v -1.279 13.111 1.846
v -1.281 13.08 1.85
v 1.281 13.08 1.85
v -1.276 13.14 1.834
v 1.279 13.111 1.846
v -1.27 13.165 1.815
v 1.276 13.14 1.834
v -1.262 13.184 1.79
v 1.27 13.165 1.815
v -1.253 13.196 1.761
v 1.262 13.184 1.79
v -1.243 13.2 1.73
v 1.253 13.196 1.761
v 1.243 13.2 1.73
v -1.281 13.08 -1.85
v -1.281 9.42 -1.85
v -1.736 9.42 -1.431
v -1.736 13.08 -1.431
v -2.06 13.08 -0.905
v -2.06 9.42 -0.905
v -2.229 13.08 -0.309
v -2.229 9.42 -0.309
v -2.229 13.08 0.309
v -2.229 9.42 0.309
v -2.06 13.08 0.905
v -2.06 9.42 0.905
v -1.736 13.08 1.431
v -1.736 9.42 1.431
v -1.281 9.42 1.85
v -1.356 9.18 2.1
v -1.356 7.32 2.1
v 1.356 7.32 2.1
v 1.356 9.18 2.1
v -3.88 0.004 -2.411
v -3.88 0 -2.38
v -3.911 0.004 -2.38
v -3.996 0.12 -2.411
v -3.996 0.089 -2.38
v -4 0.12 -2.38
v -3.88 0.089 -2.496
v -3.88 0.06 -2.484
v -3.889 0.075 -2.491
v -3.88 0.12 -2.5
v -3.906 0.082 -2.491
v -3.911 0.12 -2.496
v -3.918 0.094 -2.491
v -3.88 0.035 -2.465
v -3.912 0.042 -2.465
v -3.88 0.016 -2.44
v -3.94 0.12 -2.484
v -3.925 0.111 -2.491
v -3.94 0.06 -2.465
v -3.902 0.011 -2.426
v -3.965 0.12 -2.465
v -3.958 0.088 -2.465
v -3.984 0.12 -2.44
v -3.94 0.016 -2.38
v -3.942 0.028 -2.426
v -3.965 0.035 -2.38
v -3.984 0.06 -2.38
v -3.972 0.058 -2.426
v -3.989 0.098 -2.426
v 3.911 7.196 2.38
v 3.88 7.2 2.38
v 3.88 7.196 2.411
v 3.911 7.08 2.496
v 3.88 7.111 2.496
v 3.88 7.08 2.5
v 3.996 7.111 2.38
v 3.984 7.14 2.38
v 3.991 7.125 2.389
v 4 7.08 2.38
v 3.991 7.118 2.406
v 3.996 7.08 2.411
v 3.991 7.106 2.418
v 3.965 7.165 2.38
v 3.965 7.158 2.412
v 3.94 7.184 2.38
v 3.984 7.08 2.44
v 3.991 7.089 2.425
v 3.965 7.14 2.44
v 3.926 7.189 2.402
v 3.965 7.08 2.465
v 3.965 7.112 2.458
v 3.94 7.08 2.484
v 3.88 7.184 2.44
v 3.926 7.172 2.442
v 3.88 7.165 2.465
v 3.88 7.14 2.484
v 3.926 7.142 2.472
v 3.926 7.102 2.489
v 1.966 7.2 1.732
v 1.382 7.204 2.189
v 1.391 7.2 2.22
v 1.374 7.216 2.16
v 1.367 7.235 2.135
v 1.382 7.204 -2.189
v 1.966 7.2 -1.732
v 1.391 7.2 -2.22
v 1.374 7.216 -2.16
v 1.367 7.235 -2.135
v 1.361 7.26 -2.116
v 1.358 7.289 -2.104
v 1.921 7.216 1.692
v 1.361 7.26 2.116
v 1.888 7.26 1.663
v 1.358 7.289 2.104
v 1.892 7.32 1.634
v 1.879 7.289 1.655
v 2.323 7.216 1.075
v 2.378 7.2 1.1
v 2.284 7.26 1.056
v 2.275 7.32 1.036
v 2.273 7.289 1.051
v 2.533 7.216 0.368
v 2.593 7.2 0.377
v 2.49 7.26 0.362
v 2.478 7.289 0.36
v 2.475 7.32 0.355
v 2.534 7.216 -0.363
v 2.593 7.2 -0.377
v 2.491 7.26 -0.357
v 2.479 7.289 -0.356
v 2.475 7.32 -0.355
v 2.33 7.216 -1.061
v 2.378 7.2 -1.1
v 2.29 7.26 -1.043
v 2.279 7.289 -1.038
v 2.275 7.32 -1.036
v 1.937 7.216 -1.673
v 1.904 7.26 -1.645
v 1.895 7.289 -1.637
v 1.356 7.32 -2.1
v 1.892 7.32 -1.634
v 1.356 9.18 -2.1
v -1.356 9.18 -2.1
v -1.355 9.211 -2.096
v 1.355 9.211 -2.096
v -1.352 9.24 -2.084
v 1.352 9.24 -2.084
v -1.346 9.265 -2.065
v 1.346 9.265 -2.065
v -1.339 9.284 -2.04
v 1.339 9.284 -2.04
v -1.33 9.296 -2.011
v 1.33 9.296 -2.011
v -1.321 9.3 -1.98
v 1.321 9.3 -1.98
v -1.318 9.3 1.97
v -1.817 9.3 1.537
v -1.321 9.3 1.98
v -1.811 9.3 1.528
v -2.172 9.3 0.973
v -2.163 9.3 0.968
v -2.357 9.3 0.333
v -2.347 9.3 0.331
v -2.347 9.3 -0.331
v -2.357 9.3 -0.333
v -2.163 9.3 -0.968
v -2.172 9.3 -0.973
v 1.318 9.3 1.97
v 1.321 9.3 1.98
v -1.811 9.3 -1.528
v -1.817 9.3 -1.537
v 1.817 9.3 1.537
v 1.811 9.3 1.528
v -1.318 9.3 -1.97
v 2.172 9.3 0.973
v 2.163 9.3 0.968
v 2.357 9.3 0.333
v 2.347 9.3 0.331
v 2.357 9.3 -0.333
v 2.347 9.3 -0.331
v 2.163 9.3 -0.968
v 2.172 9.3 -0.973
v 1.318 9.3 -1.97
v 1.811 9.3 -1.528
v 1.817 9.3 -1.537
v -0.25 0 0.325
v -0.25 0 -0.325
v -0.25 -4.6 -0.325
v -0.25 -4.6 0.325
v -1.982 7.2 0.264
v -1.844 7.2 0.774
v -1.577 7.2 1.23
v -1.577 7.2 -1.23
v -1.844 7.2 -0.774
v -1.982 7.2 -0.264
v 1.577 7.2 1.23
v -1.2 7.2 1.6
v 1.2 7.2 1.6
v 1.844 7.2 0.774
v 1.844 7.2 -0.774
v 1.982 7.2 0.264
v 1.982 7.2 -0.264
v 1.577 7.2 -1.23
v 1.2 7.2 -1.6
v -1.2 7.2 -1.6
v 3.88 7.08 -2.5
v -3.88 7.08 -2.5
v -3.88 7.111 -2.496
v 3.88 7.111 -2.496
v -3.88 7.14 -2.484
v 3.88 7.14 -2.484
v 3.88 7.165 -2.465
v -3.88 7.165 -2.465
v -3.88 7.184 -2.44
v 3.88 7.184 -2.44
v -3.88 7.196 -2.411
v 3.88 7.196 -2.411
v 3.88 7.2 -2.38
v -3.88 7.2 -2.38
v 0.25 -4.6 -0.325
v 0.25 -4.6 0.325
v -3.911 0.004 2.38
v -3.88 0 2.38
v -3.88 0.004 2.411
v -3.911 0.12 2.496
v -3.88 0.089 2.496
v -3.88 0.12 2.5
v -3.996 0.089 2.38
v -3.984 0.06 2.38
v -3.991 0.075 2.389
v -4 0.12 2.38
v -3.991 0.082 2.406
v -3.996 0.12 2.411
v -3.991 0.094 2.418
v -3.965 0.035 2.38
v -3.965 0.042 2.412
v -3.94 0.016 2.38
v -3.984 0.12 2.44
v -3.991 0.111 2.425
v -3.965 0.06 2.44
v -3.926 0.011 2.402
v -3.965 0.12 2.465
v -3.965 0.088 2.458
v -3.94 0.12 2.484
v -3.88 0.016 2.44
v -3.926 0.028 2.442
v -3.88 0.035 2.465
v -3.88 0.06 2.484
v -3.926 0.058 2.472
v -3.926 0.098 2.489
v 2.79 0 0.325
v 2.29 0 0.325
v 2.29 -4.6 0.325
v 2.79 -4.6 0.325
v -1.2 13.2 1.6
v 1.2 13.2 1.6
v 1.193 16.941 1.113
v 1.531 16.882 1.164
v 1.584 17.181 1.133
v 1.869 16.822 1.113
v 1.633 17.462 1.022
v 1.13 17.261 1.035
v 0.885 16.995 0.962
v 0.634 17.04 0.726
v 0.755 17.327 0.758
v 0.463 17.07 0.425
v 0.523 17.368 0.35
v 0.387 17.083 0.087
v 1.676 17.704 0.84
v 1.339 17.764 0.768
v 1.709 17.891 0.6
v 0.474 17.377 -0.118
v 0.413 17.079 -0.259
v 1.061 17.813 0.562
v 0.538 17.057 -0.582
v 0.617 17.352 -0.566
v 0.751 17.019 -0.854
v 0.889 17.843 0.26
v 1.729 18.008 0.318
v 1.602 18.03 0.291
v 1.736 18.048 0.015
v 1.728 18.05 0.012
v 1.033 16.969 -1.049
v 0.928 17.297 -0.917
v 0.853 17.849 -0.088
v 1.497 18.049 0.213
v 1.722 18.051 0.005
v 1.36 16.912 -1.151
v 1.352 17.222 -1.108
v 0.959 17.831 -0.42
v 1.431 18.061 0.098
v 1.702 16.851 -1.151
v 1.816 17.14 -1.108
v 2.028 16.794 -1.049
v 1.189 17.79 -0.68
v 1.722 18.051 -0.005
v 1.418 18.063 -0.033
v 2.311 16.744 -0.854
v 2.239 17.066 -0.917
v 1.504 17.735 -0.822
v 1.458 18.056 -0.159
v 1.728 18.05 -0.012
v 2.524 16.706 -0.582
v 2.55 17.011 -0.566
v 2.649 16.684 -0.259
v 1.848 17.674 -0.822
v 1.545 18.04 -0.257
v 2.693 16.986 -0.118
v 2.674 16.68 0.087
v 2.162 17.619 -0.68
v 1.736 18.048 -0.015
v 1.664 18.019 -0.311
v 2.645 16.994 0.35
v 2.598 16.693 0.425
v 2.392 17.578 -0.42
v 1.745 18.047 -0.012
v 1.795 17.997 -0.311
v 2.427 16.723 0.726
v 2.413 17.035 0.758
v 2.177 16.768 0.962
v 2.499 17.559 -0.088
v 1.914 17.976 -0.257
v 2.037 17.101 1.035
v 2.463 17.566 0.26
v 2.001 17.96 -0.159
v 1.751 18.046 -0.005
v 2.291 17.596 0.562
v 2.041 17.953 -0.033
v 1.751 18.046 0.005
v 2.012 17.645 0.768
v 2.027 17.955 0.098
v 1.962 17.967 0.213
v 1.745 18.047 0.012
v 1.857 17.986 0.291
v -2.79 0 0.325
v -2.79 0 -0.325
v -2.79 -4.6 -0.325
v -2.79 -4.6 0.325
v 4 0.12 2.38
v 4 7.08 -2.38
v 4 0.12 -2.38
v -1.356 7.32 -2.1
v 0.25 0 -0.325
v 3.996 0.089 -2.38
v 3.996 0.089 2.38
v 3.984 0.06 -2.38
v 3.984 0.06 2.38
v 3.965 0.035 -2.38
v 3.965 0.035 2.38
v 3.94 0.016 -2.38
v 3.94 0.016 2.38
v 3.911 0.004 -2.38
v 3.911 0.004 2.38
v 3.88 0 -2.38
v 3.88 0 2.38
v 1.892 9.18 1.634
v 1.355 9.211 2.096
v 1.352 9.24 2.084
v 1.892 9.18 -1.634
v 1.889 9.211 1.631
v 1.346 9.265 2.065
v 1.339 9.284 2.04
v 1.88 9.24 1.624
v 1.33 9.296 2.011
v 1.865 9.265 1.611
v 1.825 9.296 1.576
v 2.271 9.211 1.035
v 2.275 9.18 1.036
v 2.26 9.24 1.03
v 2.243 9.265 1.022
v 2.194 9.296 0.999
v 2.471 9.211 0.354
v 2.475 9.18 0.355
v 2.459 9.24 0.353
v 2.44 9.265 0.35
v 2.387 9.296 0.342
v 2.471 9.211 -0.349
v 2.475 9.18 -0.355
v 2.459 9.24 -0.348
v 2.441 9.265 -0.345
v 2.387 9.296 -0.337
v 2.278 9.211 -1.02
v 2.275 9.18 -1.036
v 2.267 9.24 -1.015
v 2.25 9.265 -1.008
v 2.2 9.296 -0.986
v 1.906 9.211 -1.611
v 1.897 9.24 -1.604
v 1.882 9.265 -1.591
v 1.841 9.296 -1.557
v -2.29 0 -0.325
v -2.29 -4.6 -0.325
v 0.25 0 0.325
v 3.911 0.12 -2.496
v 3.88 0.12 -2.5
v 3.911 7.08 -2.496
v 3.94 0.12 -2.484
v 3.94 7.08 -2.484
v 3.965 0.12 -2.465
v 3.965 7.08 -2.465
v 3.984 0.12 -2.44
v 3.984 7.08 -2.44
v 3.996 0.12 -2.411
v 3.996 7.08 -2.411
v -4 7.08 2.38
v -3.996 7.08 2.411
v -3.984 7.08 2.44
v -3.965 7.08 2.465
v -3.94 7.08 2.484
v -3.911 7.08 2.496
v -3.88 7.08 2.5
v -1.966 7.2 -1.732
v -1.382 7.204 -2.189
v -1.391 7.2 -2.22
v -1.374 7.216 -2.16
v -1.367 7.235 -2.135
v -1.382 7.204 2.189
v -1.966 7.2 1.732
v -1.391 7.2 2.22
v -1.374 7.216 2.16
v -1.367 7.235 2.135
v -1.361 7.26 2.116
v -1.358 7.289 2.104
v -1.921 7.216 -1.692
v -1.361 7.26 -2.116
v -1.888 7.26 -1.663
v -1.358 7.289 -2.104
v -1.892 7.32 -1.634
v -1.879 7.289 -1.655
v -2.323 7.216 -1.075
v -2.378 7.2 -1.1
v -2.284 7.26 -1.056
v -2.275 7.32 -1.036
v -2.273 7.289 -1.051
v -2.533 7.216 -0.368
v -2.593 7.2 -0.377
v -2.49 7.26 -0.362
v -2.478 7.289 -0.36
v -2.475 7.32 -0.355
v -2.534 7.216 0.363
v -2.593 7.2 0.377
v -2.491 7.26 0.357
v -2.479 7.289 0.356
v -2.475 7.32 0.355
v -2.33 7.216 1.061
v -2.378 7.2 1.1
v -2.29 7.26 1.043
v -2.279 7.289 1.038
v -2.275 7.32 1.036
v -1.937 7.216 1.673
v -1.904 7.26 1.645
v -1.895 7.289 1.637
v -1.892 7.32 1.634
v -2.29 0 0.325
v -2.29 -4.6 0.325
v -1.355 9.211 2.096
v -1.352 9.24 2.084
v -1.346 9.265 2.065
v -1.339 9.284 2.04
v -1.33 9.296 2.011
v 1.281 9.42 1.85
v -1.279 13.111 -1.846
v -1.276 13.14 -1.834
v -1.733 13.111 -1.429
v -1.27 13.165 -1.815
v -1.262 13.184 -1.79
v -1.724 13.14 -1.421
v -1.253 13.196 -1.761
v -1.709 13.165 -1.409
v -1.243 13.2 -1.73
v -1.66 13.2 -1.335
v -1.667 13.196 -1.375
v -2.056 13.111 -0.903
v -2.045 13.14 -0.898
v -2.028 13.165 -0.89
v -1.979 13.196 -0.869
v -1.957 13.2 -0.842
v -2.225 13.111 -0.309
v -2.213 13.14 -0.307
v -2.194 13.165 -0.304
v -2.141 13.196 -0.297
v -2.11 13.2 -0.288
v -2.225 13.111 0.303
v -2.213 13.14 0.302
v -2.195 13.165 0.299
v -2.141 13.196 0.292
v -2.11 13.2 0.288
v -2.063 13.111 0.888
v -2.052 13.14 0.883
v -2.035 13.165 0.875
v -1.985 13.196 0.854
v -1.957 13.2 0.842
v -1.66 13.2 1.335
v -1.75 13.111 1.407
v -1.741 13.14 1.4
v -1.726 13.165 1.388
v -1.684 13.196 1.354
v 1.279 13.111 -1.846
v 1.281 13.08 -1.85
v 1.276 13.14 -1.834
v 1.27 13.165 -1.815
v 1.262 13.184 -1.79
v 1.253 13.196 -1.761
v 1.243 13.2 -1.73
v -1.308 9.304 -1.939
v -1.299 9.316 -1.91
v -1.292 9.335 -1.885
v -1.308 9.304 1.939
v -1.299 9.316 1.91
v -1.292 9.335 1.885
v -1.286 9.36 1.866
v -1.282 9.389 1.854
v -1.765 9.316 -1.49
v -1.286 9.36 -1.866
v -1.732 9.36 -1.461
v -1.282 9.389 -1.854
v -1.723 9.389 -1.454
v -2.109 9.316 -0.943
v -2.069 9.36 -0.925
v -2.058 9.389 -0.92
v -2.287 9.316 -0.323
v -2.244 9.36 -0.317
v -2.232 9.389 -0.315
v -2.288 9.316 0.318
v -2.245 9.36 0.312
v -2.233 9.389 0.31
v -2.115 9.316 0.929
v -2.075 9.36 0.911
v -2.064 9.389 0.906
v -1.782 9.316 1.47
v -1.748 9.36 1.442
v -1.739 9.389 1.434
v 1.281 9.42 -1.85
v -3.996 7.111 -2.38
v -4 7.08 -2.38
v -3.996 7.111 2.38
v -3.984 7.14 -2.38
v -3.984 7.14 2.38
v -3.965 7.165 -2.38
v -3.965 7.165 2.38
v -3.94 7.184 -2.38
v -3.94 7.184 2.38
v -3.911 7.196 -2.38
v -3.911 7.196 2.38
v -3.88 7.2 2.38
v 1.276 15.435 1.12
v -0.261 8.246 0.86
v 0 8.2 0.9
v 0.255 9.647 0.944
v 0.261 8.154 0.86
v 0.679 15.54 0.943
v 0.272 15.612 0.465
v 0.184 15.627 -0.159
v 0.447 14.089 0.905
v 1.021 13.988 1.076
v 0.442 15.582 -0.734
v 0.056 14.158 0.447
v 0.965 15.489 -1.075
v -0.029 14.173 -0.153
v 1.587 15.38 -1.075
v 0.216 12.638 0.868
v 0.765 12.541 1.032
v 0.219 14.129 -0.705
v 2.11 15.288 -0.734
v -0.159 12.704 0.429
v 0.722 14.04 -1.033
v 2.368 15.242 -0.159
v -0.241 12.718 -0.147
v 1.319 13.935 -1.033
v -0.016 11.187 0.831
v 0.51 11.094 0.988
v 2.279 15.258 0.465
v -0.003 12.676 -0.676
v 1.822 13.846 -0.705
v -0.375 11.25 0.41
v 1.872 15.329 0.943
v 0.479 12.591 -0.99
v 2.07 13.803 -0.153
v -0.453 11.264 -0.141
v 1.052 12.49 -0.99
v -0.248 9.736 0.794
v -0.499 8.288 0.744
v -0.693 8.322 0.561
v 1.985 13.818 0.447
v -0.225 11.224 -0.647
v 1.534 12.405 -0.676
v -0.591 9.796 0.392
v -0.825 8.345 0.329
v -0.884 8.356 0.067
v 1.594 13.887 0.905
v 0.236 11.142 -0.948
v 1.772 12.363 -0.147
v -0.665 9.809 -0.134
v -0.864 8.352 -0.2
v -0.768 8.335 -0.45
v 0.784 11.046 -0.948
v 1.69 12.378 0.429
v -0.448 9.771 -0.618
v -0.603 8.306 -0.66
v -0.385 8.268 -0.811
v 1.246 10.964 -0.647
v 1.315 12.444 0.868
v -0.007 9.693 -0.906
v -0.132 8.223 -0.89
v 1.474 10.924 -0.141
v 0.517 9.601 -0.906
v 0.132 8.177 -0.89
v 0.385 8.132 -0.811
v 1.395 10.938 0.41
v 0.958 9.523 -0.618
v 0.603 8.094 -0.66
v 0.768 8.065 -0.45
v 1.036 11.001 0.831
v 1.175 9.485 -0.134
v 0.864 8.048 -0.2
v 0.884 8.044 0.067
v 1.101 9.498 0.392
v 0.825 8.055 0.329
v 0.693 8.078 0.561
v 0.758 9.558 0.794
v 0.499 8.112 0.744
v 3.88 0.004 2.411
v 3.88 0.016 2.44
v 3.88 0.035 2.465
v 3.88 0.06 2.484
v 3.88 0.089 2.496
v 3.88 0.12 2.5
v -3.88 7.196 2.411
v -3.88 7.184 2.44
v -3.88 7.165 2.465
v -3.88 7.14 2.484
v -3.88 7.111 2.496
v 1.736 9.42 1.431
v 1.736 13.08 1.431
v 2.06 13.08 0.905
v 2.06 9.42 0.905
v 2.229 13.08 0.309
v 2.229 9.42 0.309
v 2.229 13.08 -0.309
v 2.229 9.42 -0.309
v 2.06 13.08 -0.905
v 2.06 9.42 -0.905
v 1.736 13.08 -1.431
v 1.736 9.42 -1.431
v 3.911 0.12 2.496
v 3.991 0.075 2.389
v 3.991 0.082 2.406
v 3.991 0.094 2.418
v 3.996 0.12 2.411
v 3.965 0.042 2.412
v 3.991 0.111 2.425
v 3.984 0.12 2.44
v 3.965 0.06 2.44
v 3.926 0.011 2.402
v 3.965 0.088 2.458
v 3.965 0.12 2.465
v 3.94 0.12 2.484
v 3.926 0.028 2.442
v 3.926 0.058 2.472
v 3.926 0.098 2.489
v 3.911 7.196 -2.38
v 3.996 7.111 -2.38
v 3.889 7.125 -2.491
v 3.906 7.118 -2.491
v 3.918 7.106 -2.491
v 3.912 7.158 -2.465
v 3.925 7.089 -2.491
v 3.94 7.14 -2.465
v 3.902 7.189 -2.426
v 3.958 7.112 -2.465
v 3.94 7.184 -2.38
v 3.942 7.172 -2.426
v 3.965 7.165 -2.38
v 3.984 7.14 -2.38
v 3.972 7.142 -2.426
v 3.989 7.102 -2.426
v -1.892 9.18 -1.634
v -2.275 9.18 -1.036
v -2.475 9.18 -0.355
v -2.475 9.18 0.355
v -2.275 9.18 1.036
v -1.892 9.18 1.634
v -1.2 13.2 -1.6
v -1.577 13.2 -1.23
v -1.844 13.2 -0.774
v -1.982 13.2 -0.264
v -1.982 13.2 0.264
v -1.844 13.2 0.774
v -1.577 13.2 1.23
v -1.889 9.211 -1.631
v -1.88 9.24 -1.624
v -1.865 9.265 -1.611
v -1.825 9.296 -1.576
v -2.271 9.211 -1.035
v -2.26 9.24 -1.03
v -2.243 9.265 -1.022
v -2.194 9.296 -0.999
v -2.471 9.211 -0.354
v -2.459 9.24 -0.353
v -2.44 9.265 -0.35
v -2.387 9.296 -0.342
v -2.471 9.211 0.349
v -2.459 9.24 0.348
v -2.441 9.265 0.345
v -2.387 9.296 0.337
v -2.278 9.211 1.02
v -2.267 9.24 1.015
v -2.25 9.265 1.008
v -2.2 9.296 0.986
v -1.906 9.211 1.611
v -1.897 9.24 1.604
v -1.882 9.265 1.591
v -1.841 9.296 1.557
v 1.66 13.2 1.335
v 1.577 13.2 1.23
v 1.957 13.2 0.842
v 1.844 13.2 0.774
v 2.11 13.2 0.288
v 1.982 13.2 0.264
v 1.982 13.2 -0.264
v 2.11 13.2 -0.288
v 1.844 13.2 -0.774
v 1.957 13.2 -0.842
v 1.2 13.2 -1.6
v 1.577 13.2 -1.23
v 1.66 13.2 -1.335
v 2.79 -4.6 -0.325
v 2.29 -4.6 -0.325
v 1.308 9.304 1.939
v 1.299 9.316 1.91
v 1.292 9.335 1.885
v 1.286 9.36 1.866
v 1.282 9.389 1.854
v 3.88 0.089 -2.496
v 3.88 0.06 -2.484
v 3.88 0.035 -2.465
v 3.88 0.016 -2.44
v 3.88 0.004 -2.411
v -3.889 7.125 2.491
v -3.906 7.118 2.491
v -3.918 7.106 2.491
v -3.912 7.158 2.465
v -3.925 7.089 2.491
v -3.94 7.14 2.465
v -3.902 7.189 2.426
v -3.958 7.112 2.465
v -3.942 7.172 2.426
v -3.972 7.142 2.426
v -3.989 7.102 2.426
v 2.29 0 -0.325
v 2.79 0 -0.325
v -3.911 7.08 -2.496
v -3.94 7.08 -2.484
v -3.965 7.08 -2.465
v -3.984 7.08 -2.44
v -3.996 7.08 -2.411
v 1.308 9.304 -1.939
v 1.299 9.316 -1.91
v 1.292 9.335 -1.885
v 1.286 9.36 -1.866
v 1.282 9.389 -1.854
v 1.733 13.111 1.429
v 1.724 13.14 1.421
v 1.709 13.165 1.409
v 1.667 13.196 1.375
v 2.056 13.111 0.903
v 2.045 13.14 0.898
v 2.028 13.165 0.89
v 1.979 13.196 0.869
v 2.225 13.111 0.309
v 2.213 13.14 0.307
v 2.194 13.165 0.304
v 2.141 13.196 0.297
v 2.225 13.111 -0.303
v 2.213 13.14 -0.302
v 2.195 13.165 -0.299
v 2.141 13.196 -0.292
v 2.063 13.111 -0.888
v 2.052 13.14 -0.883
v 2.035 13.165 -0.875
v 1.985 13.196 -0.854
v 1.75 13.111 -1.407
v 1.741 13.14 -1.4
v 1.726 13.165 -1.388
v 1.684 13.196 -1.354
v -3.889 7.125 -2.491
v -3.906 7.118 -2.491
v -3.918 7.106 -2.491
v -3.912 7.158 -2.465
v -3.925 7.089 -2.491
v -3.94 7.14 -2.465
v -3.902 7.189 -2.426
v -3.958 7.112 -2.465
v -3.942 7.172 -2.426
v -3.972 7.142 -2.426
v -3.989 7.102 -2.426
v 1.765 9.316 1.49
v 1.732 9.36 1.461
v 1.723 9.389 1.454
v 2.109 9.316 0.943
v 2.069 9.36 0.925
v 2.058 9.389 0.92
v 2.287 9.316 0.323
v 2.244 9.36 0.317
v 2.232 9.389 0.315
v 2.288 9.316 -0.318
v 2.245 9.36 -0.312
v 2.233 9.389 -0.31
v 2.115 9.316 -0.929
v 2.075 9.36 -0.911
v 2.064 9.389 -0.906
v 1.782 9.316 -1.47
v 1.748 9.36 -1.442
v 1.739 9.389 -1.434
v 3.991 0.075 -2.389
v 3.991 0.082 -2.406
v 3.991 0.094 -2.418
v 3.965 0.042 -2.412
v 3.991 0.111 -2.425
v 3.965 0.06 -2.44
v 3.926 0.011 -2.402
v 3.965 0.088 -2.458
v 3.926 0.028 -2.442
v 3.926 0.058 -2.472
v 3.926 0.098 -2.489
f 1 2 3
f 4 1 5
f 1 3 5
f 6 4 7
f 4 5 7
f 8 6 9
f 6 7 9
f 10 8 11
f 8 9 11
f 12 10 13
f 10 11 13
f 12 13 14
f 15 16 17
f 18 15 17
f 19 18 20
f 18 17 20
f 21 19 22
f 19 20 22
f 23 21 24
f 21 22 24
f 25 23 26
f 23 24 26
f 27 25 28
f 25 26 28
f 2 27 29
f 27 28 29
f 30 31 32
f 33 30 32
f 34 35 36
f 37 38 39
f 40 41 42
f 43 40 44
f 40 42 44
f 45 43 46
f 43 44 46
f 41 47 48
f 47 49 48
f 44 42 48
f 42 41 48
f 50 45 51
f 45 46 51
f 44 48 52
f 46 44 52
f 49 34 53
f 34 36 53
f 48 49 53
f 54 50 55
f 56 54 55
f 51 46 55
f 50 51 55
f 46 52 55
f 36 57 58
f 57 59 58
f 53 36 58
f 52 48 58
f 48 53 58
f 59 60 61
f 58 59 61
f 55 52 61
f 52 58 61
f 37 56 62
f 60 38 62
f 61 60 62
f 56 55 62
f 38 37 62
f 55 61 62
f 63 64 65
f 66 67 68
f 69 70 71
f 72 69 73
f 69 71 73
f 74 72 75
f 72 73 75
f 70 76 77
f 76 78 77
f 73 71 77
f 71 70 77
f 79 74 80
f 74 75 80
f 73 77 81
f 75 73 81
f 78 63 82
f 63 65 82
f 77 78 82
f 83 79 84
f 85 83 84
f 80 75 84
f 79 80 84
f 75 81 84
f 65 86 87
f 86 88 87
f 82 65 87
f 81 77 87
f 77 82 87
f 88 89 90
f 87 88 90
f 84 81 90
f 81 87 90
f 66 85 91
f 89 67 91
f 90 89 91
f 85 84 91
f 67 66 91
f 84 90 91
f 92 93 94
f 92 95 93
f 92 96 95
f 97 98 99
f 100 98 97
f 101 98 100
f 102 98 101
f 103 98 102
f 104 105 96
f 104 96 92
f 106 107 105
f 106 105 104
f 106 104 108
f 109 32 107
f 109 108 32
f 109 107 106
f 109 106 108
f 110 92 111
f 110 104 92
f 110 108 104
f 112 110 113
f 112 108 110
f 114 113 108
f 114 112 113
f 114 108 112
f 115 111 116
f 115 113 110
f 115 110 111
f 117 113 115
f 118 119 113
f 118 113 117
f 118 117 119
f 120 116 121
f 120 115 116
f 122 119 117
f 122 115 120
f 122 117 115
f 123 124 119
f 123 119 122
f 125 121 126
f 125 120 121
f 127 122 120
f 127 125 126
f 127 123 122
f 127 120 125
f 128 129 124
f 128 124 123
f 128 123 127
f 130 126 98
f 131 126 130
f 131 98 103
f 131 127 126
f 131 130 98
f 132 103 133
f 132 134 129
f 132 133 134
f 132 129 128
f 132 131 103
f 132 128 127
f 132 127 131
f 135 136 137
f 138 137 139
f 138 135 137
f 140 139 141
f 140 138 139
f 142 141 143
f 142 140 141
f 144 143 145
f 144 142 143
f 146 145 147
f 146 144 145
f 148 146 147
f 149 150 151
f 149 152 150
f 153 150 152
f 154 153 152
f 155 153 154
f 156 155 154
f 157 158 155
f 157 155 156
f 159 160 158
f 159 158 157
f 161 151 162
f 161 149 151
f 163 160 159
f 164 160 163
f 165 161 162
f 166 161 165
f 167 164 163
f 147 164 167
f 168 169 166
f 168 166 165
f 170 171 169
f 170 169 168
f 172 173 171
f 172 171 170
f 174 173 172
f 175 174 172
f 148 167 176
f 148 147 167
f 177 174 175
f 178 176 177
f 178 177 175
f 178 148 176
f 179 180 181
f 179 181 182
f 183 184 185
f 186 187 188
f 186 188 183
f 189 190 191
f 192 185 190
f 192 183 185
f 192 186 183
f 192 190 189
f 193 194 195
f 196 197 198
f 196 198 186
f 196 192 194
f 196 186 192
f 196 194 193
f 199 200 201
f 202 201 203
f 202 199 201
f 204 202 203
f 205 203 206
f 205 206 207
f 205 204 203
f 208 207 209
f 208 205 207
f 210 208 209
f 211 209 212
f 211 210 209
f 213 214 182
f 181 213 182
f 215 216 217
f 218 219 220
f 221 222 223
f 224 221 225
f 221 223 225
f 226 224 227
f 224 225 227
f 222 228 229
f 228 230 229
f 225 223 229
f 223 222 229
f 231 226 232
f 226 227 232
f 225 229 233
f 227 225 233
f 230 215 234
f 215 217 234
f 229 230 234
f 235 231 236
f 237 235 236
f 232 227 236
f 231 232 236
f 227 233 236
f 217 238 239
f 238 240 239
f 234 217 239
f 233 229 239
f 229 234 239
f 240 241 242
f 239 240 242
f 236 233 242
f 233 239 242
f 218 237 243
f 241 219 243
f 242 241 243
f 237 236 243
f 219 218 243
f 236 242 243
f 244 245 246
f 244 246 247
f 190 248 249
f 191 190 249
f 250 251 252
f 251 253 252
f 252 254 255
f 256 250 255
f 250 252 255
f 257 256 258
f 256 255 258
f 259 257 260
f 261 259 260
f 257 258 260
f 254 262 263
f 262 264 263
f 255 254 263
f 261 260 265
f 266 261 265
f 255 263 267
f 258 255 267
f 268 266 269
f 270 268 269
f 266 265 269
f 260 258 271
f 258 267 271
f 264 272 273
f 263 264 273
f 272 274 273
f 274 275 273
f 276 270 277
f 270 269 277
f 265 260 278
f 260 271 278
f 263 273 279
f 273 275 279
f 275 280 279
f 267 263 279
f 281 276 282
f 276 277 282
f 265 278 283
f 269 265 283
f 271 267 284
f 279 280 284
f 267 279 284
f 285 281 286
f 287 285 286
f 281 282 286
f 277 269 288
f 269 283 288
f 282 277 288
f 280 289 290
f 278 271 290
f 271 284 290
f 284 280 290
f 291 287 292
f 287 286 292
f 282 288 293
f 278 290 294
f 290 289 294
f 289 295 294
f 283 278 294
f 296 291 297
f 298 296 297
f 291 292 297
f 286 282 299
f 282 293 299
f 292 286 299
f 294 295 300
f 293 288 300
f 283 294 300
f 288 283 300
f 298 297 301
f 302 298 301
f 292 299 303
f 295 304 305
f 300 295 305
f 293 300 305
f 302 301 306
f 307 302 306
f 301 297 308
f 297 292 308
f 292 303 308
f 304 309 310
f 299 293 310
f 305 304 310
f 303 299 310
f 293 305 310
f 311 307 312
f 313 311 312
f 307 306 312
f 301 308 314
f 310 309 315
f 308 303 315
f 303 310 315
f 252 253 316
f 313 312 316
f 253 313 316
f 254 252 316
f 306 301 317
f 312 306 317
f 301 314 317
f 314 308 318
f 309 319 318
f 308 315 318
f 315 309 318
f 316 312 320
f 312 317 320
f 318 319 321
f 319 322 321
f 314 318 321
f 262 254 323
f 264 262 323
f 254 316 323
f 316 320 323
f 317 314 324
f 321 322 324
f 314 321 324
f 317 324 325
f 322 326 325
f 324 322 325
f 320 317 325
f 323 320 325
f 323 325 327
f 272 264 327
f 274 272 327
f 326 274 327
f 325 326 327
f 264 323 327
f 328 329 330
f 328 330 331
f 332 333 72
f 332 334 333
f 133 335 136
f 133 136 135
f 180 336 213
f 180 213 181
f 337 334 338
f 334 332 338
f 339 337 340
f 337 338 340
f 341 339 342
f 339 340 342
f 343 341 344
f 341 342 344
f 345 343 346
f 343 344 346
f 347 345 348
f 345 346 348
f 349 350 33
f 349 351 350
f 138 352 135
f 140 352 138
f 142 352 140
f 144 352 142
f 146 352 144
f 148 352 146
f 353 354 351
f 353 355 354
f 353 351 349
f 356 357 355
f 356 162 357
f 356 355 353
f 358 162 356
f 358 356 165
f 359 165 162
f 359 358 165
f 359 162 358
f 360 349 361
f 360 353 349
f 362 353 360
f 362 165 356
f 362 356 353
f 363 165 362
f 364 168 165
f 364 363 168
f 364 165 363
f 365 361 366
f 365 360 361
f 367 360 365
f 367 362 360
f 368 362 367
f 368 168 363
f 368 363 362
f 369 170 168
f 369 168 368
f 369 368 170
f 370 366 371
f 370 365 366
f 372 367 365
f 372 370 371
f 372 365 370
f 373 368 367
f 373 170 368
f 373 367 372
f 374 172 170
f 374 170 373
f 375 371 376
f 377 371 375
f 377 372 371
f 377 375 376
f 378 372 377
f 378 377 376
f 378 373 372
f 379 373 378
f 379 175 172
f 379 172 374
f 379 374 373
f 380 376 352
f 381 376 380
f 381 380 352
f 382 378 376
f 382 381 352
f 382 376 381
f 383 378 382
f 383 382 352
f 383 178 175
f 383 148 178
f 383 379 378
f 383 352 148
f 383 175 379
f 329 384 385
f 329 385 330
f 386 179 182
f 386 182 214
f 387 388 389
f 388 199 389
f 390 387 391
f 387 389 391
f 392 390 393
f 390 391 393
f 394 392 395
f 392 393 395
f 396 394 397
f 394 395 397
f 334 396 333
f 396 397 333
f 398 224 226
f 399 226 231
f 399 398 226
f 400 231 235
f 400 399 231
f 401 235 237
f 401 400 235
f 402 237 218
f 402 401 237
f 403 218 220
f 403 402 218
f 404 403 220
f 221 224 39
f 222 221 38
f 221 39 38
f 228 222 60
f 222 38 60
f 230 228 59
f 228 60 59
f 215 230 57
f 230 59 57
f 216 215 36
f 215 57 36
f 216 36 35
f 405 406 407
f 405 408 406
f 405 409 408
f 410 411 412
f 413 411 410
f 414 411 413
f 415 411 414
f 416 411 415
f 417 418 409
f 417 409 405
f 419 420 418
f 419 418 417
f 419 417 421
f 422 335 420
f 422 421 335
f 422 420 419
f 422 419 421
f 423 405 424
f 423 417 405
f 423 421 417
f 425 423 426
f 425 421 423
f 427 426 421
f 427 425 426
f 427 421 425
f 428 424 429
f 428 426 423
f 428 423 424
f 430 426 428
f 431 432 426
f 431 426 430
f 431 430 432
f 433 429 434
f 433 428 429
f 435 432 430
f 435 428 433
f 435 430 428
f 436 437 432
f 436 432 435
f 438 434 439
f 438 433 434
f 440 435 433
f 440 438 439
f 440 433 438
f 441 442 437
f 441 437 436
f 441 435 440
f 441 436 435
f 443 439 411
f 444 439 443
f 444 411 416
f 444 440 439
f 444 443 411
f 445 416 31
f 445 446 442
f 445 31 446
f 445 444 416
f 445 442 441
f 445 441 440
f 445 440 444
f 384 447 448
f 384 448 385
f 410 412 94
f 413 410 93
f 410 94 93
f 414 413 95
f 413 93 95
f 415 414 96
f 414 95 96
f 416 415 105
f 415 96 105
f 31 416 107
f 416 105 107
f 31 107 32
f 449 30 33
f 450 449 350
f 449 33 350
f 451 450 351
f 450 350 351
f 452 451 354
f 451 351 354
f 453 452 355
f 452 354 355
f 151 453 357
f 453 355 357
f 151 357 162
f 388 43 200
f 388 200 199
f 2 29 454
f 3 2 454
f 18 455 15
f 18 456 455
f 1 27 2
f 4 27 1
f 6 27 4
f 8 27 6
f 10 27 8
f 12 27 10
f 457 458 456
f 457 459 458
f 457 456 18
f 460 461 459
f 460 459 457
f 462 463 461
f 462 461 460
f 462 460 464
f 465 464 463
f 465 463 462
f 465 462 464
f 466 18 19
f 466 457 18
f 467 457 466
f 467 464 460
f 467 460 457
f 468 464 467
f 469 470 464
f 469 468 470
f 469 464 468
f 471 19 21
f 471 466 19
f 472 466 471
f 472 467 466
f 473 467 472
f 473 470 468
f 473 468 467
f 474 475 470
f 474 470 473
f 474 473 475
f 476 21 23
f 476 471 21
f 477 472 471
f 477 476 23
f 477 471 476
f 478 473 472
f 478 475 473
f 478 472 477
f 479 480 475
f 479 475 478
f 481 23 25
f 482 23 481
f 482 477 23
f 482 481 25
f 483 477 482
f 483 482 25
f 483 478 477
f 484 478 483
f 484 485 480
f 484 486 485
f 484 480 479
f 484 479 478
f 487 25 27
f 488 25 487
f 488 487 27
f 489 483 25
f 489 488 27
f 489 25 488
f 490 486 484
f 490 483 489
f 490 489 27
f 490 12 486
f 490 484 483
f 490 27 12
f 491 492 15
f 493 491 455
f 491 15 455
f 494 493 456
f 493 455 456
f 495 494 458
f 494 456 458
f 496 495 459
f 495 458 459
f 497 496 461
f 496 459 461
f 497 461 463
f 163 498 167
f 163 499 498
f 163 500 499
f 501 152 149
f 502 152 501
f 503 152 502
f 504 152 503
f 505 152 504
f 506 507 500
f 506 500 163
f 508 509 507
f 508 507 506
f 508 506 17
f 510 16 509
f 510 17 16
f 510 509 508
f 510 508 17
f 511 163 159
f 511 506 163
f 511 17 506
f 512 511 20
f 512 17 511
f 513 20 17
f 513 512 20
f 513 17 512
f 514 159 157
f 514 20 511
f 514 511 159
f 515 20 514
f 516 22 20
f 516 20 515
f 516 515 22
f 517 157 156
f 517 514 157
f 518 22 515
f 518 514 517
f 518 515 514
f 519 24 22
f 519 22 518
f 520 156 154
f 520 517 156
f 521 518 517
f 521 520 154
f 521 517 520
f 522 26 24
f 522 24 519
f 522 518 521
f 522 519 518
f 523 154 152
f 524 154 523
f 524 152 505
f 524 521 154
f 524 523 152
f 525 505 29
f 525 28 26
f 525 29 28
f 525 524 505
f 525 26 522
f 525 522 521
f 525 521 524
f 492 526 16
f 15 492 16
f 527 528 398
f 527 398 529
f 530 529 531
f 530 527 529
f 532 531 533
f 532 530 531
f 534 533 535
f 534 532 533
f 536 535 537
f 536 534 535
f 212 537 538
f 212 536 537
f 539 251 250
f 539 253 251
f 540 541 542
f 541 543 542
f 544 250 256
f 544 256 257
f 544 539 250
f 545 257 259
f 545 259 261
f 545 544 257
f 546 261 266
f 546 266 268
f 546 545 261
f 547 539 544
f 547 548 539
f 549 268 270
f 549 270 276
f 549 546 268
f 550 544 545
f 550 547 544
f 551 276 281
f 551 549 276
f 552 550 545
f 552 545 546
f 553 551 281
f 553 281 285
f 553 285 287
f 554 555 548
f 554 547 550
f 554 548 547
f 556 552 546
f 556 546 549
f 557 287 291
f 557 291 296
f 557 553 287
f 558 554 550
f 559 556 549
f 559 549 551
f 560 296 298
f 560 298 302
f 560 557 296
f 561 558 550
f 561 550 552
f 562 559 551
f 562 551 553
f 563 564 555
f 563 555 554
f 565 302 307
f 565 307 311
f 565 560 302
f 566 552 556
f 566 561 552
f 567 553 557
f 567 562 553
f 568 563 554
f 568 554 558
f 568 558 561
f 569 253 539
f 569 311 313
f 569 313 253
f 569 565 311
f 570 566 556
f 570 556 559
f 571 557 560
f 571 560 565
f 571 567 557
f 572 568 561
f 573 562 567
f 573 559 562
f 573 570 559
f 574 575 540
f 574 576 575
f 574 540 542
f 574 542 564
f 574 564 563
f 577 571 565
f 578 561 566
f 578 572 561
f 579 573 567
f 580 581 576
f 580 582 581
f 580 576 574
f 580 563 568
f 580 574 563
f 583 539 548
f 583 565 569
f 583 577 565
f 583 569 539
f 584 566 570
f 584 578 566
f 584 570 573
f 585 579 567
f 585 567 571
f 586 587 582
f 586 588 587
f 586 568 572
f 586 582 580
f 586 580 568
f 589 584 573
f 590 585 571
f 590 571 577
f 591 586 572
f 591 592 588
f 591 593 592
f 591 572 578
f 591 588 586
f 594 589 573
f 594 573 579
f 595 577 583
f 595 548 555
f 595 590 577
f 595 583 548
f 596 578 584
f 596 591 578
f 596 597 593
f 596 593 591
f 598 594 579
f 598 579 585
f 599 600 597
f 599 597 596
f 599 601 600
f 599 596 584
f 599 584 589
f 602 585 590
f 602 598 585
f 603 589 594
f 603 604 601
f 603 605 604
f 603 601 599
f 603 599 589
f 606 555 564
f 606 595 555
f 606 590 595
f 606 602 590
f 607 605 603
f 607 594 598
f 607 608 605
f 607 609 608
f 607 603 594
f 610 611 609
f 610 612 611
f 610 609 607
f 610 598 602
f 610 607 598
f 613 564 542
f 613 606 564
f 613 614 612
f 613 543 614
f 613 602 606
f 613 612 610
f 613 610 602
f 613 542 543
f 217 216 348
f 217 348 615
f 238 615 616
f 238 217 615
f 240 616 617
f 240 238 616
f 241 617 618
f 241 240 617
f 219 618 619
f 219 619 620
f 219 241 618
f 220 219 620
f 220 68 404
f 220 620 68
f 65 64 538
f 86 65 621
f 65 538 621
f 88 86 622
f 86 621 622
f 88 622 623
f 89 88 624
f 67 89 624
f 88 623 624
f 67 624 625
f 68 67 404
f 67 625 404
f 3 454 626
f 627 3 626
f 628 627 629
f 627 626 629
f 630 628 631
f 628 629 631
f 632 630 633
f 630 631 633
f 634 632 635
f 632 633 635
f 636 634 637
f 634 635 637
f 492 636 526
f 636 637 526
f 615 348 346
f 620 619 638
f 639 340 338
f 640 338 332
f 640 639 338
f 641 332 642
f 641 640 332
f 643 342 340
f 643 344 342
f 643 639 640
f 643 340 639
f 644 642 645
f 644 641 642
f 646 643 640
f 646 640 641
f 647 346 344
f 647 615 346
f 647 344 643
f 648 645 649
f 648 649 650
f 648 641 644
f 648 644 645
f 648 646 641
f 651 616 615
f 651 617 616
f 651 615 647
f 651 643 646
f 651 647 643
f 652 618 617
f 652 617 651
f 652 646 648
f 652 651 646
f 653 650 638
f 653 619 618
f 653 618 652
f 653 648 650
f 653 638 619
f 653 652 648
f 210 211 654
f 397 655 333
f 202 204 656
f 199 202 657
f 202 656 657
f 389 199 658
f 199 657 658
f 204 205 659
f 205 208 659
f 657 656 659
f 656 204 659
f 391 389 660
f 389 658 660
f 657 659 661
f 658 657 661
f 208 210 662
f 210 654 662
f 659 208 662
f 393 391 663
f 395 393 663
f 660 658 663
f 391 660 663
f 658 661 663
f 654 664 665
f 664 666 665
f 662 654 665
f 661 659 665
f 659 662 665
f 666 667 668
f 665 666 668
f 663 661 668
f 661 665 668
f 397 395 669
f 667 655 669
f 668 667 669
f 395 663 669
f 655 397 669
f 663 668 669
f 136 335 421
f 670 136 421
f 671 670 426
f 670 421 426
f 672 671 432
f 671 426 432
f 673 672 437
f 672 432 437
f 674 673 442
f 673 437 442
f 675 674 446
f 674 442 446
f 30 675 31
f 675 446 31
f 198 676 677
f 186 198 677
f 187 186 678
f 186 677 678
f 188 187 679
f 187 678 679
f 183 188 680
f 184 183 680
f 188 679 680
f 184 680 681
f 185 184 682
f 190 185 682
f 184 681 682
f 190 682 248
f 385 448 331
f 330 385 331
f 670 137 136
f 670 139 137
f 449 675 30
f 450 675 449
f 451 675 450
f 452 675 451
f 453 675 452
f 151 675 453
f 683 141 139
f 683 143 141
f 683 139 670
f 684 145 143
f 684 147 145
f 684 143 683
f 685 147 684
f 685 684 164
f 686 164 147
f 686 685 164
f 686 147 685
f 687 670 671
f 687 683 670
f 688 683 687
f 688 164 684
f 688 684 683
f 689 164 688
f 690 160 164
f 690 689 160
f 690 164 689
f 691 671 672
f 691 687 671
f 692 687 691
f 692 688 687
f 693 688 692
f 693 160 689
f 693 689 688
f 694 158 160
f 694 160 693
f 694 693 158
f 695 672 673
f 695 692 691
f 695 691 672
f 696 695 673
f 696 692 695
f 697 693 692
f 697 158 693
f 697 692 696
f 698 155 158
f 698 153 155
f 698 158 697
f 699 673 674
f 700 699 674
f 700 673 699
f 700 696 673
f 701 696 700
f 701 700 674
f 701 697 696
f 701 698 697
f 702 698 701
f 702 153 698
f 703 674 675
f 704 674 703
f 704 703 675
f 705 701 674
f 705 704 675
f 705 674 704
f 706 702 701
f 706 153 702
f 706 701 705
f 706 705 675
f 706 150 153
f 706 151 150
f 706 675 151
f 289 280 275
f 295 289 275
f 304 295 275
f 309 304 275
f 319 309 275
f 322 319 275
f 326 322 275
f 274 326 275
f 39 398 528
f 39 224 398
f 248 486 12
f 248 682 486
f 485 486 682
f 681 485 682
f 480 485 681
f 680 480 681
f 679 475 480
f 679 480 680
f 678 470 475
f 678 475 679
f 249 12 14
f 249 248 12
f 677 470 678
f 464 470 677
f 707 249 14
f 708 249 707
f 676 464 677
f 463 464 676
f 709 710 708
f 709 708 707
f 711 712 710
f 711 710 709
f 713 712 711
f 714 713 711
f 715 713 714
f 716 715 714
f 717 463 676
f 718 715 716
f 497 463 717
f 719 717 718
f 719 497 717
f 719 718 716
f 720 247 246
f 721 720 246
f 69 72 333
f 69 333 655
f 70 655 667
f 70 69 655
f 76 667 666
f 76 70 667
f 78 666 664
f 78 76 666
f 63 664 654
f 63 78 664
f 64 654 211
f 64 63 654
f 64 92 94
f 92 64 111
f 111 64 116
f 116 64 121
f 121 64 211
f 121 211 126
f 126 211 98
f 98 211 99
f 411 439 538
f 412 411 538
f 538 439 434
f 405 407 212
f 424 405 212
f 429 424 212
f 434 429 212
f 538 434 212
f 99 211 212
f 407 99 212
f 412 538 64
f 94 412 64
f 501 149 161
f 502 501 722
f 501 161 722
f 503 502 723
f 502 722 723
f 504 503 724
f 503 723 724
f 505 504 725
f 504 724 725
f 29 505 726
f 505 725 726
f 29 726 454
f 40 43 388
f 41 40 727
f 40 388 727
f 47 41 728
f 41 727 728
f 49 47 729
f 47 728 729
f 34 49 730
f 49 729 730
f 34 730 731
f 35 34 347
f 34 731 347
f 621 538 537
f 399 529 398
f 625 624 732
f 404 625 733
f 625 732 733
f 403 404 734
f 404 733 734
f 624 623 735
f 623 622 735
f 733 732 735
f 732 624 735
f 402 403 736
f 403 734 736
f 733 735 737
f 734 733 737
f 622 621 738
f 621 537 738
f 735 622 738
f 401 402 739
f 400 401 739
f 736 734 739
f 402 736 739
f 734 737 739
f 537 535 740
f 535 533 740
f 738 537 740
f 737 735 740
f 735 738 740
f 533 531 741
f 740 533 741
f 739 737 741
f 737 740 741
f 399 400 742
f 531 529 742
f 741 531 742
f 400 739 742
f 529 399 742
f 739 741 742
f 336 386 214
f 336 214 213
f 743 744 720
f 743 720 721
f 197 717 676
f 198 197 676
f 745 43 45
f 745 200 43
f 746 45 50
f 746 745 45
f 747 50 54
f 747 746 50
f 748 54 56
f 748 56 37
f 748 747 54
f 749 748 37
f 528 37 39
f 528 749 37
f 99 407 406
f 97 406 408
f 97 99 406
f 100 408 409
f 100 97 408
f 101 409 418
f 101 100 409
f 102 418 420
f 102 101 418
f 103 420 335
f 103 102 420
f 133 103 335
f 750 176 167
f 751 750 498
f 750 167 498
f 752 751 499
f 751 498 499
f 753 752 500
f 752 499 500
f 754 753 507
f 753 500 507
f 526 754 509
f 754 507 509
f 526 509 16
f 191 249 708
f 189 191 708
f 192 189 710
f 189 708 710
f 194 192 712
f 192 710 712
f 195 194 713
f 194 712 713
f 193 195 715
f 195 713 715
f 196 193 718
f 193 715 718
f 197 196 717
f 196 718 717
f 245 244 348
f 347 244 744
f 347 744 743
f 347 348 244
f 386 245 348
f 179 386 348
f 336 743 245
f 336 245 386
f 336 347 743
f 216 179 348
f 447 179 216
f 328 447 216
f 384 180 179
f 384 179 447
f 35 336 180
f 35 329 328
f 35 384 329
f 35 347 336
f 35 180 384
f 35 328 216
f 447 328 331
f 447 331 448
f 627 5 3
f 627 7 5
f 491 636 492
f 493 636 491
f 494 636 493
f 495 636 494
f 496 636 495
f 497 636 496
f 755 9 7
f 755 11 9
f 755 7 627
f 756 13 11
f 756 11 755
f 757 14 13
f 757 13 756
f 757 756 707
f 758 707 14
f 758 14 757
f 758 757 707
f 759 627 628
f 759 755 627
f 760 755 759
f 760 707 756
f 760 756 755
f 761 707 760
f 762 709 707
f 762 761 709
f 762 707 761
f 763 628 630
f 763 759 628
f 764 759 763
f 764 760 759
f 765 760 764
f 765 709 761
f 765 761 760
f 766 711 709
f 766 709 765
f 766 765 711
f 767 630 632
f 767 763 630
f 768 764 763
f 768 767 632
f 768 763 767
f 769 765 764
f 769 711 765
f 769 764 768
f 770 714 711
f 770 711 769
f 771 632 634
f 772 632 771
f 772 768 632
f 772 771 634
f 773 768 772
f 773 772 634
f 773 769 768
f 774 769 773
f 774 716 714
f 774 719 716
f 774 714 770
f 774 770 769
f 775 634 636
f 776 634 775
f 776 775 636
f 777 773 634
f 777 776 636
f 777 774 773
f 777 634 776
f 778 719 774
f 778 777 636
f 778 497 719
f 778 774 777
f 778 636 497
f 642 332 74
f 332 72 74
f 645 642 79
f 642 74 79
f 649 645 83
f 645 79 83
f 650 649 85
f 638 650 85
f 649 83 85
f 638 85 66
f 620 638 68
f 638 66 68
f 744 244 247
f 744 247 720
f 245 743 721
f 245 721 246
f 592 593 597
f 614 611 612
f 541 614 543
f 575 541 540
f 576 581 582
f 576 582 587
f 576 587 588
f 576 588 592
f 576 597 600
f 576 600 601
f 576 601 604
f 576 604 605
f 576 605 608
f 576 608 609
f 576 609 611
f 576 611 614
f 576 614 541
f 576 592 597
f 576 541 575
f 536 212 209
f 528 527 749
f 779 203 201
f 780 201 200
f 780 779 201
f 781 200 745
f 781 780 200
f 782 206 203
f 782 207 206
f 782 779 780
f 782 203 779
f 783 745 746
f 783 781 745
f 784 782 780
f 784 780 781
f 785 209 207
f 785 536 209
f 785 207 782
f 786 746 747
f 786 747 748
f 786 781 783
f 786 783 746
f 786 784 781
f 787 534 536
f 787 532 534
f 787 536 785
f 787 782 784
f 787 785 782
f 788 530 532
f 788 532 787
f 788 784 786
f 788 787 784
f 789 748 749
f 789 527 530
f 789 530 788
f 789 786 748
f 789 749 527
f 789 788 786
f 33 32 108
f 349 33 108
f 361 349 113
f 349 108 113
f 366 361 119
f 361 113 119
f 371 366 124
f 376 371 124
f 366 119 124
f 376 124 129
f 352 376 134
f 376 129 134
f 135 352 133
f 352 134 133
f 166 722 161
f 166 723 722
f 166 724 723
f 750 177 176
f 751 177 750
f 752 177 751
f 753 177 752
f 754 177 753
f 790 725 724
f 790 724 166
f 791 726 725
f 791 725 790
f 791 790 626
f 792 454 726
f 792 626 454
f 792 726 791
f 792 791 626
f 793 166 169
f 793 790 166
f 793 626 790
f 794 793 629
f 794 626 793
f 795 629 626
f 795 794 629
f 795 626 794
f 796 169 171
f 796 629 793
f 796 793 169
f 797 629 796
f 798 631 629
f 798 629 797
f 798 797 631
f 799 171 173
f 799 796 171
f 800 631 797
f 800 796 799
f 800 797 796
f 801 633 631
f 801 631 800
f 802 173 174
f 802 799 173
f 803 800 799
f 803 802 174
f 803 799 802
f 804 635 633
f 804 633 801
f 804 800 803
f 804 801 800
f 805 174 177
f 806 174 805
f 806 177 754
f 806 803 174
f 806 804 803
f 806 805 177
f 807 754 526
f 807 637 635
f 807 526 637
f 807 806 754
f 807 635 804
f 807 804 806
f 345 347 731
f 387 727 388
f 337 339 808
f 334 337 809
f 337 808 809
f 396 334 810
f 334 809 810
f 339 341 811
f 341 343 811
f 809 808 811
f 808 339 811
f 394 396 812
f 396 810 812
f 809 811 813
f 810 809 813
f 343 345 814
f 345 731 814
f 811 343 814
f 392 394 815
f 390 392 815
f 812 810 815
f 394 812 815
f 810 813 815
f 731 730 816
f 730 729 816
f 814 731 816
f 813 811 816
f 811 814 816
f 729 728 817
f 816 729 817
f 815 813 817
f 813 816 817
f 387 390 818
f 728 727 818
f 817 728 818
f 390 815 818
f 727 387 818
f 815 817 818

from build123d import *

# Parameters (mm, degrees)
BOSS_EXTRUDE1_DEPTH = 7.2
SKETCH2_W           = 2.712931993250106
SKETCH2_H           = 4.2
BOSS_EXTRUDE2_DEPTH = 2.1
BOSS_EXTRUDE3_DEPTH = 3.9
CUT_EXTRUDE1_DEPTH  = 6
SKETCH6_R           = 1.2
SKETCH5_R           = 0.9
FILLET1_R           = 1.15
BOSS_EXTRUDE4_DEPTH = 4.6
FILLET2_R           = 0.12


with BuildPart() as part:
    # Sketch1 → Boss-Extrude1 (new body)
    with BuildSketch(Plane(origin=(0, 0, 0), x_dir=(1, 0, 0), z_dir=(0, 1, 0))):
        Polygon((-3.999999999999999, 2.5), (4.000000000000001, 2.5), (4.000000000000003, -2.5), (-3.9999999999999982, -2.5), align=None)
    extrude(amount=BOSS_EXTRUDE1_DEPTH)

    # Sketch2 → Boss-Extrude2 (add)
    with BuildSketch(Plane(origin=(0, 7.2, 0), x_dir=(1, 0, 0), z_dir=(0, 1, 0))):
        with BuildLine():
            ThreePointArc((-1.3564659966250532, 2.1000000000000005), (-2.5, 3.1e-16), (-1.3564659966250527, -2.1000000000000005))
            Line((-1.3564659966250527, -2.1), (-1.3564659966250527, 2.1))
        make_face()
        Rectangle(SKETCH2_W, SKETCH2_H)
        with BuildLine():
            Line((1.3564659966250532, 2.1), (1.3564659966250532, -2.1))
            ThreePointArc((1.3564659966250519, -2.100000000000001), (2.1955824957813164, -1.1955824957813181), (2.5, -6.1e-16))
            ThreePointArc((2.5, 0), (2.195582495781317, 1.1955824957813173), (1.3564659966250532, 2.1))
        make_face()
    extrude(amount=BOSS_EXTRUDE2_DEPTH)

    # Sketch3 → Boss-Extrude3 (add)
    with BuildSketch(Plane(origin=(0, 9.299999999999999, 0), x_dir=(1, 0, 0), z_dir=(0, 1, 0))):
        with BuildLine():
            Line((-1.2806248474869384, -1.8500000000000003), (1.28062484748694, -1.8500000000000003))
            ThreePointArc((1.28062484748694, -1.8500000000000003), (2.250000000000211, 0), (1.2806248474869395, 1.8500000000000003))
            Line((1.2806248474869395, 1.8500000000000003), (-1.2806248474869382, 1.8500000000000003))
            ThreePointArc((-1.2806248474869382, 1.8500000000000003), (-2.25000000000021, 2.8e-16), (-1.2806248474869384, -1.8500000000000003))
        make_face()
    extrude(amount=BOSS_EXTRUDE3_DEPTH)

    # Sketch4 → Cut-Extrude1 (cut)
    with BuildSketch(Plane(origin=(0, 13.2, 0), x_dir=(1, 0, 0), z_dir=(0, 1, 0))):
        with BuildLine():
            Line((1.200000000001133, 1.6000000000000003), (-1.200000000001132, 1.6000000000000003))
            ThreePointArc((-1.200000000001132, 1.6000000000000003), (-2.0000000000006795, 2.4e-16), (-1.200000000001132, -1.6000000000000003))
            Line((-1.200000000001132, -1.6000000000000003), (1.2000000000011335, -1.6000000000000003))
            ThreePointArc((1.2000000000011335, -1.6000000000000003), (2.0000000000006803, 2.2e-16), (1.200000000001133, 1.6000000000000003))
        make_face()
    extrude(amount=-CUT_EXTRUDE1_DEPTH, mode=Mode.SUBTRACT)

    # Sketch7 → Boss-Extrude4 (add)
    with BuildSketch(Plane.XZ):
        Polygon((2.790000000000003, 0.3249999999999992), (2.790000000000003, -0.3250000000000008), (2.290000000000003, -0.3250000000000008), (2.290000000000003, 0.3249999999999991), align=None)
        Polygon((-0.2500000000000001, 0.32499999999999996), (0.2499999999999999, 0.32499999999999996), (0.25000000000000006, -0.325), (-0.25000000000000006, -0.325), align=None)
        Polygon((-2.7900000000000005, 0.32500000000000007), (-2.2900000000000005, 0.325), (-2.2900000000000005, -0.32499999999999996), (-2.7900000000000005, -0.32499999999999996), align=None)
    extrude(amount=BOSS_EXTRUDE4_DEPTH)

    # Fillet2
    fillet2_edges = [part.edges().sort_by_distance(p)[0] for p in [
        (-3.9999999999999987, 7.2, 0),
        (2.66e-15, 7.2, 2.5),
        (-2.499999999999999, 7.2, 2.2e-16),
        (2.2e-16, 9.3, 2.1),
        (2.5, 7.2, 6.7e-16),
        (2.2e-16, 7.2, -2.1),
        (-2.499999999999999, 9.3, 2.2e-16),
        (2.5, 9.3, 4.4e-16),
        (2.2e-16, 9.3, -2.1),
        (2.2e-16, 7.2, 2.1),
        (-2.25000000000021, 9.299999999999999, -2.2e-16),
        (8.9e-16, 9.299999999999999, 1.8500000000000003),
        (2.2500000000002114, 9.299999999999999, -2.2e-16),
        (6.7e-16, 9.299999999999999, -1.8500000000000003),
        (6.7e-16, 13.2, -1.8500000000000003),
        (-2.25000000000021, 13.2, -2.2e-16),
        (8.9e-16, 13.2, 1.8500000000000003),
        (2.2500000000002114, 13.2, -2.2e-16),
        (4.000000000000002, 7.2, 0),
        (2.66e-15, 0, 2.5),
        (-3.9999999999999987, 0, 0),
        (8.9e-16, 0, -2.5),
        (4.000000000000002, 0, 0),
        (8.9e-16, 7.2, -2.5),
        (4.000000000000003, 3.6, 2.5),
        (-3.9999999999999982, 3.6, 2.5),
        (-3.999999999999999, 3.6, -2.5),
        (4.000000000000001, 3.6, -2.5),
    ]]
    fillet(fillet2_edges, radius=FILLET2_R)


with BuildPart() as body_2:
    # Sketch6 → Loft1 section 0
    with BuildSketch(Plane(origin=(3.1387643643044916, 17.80081727534432, 0), x_dir=(0, 0, 1), z_dir=(-0.17364817766692736, -0.9848077530122086, 0))):
        with Locations((0, 1.4239150568688042)):
            Circle(SKETCH6_R)
    # Sketch5 → Loft1 section 1
    with BuildSketch(Plane(origin=(1.4022825876352183, 7.952739745222232, 0), x_dir=(0, 0, 1), z_dir=(-0.17364817766692736, -0.9848077530122086, 0))):
        with Locations((0, 1.4239150568688042)):
            Circle(SKETCH5_R)
    loft()

    # Fillet1
    fillet1_edges = [body_2.edges().sort_by_distance(p)[0] for p in [
        (1.736481776669273, 18.048077530122086, -1.2),
    ]]
    fillet(fillet1_edges, radius=FILLET1_R)


solid = Compound([part.part, body_2.part])
